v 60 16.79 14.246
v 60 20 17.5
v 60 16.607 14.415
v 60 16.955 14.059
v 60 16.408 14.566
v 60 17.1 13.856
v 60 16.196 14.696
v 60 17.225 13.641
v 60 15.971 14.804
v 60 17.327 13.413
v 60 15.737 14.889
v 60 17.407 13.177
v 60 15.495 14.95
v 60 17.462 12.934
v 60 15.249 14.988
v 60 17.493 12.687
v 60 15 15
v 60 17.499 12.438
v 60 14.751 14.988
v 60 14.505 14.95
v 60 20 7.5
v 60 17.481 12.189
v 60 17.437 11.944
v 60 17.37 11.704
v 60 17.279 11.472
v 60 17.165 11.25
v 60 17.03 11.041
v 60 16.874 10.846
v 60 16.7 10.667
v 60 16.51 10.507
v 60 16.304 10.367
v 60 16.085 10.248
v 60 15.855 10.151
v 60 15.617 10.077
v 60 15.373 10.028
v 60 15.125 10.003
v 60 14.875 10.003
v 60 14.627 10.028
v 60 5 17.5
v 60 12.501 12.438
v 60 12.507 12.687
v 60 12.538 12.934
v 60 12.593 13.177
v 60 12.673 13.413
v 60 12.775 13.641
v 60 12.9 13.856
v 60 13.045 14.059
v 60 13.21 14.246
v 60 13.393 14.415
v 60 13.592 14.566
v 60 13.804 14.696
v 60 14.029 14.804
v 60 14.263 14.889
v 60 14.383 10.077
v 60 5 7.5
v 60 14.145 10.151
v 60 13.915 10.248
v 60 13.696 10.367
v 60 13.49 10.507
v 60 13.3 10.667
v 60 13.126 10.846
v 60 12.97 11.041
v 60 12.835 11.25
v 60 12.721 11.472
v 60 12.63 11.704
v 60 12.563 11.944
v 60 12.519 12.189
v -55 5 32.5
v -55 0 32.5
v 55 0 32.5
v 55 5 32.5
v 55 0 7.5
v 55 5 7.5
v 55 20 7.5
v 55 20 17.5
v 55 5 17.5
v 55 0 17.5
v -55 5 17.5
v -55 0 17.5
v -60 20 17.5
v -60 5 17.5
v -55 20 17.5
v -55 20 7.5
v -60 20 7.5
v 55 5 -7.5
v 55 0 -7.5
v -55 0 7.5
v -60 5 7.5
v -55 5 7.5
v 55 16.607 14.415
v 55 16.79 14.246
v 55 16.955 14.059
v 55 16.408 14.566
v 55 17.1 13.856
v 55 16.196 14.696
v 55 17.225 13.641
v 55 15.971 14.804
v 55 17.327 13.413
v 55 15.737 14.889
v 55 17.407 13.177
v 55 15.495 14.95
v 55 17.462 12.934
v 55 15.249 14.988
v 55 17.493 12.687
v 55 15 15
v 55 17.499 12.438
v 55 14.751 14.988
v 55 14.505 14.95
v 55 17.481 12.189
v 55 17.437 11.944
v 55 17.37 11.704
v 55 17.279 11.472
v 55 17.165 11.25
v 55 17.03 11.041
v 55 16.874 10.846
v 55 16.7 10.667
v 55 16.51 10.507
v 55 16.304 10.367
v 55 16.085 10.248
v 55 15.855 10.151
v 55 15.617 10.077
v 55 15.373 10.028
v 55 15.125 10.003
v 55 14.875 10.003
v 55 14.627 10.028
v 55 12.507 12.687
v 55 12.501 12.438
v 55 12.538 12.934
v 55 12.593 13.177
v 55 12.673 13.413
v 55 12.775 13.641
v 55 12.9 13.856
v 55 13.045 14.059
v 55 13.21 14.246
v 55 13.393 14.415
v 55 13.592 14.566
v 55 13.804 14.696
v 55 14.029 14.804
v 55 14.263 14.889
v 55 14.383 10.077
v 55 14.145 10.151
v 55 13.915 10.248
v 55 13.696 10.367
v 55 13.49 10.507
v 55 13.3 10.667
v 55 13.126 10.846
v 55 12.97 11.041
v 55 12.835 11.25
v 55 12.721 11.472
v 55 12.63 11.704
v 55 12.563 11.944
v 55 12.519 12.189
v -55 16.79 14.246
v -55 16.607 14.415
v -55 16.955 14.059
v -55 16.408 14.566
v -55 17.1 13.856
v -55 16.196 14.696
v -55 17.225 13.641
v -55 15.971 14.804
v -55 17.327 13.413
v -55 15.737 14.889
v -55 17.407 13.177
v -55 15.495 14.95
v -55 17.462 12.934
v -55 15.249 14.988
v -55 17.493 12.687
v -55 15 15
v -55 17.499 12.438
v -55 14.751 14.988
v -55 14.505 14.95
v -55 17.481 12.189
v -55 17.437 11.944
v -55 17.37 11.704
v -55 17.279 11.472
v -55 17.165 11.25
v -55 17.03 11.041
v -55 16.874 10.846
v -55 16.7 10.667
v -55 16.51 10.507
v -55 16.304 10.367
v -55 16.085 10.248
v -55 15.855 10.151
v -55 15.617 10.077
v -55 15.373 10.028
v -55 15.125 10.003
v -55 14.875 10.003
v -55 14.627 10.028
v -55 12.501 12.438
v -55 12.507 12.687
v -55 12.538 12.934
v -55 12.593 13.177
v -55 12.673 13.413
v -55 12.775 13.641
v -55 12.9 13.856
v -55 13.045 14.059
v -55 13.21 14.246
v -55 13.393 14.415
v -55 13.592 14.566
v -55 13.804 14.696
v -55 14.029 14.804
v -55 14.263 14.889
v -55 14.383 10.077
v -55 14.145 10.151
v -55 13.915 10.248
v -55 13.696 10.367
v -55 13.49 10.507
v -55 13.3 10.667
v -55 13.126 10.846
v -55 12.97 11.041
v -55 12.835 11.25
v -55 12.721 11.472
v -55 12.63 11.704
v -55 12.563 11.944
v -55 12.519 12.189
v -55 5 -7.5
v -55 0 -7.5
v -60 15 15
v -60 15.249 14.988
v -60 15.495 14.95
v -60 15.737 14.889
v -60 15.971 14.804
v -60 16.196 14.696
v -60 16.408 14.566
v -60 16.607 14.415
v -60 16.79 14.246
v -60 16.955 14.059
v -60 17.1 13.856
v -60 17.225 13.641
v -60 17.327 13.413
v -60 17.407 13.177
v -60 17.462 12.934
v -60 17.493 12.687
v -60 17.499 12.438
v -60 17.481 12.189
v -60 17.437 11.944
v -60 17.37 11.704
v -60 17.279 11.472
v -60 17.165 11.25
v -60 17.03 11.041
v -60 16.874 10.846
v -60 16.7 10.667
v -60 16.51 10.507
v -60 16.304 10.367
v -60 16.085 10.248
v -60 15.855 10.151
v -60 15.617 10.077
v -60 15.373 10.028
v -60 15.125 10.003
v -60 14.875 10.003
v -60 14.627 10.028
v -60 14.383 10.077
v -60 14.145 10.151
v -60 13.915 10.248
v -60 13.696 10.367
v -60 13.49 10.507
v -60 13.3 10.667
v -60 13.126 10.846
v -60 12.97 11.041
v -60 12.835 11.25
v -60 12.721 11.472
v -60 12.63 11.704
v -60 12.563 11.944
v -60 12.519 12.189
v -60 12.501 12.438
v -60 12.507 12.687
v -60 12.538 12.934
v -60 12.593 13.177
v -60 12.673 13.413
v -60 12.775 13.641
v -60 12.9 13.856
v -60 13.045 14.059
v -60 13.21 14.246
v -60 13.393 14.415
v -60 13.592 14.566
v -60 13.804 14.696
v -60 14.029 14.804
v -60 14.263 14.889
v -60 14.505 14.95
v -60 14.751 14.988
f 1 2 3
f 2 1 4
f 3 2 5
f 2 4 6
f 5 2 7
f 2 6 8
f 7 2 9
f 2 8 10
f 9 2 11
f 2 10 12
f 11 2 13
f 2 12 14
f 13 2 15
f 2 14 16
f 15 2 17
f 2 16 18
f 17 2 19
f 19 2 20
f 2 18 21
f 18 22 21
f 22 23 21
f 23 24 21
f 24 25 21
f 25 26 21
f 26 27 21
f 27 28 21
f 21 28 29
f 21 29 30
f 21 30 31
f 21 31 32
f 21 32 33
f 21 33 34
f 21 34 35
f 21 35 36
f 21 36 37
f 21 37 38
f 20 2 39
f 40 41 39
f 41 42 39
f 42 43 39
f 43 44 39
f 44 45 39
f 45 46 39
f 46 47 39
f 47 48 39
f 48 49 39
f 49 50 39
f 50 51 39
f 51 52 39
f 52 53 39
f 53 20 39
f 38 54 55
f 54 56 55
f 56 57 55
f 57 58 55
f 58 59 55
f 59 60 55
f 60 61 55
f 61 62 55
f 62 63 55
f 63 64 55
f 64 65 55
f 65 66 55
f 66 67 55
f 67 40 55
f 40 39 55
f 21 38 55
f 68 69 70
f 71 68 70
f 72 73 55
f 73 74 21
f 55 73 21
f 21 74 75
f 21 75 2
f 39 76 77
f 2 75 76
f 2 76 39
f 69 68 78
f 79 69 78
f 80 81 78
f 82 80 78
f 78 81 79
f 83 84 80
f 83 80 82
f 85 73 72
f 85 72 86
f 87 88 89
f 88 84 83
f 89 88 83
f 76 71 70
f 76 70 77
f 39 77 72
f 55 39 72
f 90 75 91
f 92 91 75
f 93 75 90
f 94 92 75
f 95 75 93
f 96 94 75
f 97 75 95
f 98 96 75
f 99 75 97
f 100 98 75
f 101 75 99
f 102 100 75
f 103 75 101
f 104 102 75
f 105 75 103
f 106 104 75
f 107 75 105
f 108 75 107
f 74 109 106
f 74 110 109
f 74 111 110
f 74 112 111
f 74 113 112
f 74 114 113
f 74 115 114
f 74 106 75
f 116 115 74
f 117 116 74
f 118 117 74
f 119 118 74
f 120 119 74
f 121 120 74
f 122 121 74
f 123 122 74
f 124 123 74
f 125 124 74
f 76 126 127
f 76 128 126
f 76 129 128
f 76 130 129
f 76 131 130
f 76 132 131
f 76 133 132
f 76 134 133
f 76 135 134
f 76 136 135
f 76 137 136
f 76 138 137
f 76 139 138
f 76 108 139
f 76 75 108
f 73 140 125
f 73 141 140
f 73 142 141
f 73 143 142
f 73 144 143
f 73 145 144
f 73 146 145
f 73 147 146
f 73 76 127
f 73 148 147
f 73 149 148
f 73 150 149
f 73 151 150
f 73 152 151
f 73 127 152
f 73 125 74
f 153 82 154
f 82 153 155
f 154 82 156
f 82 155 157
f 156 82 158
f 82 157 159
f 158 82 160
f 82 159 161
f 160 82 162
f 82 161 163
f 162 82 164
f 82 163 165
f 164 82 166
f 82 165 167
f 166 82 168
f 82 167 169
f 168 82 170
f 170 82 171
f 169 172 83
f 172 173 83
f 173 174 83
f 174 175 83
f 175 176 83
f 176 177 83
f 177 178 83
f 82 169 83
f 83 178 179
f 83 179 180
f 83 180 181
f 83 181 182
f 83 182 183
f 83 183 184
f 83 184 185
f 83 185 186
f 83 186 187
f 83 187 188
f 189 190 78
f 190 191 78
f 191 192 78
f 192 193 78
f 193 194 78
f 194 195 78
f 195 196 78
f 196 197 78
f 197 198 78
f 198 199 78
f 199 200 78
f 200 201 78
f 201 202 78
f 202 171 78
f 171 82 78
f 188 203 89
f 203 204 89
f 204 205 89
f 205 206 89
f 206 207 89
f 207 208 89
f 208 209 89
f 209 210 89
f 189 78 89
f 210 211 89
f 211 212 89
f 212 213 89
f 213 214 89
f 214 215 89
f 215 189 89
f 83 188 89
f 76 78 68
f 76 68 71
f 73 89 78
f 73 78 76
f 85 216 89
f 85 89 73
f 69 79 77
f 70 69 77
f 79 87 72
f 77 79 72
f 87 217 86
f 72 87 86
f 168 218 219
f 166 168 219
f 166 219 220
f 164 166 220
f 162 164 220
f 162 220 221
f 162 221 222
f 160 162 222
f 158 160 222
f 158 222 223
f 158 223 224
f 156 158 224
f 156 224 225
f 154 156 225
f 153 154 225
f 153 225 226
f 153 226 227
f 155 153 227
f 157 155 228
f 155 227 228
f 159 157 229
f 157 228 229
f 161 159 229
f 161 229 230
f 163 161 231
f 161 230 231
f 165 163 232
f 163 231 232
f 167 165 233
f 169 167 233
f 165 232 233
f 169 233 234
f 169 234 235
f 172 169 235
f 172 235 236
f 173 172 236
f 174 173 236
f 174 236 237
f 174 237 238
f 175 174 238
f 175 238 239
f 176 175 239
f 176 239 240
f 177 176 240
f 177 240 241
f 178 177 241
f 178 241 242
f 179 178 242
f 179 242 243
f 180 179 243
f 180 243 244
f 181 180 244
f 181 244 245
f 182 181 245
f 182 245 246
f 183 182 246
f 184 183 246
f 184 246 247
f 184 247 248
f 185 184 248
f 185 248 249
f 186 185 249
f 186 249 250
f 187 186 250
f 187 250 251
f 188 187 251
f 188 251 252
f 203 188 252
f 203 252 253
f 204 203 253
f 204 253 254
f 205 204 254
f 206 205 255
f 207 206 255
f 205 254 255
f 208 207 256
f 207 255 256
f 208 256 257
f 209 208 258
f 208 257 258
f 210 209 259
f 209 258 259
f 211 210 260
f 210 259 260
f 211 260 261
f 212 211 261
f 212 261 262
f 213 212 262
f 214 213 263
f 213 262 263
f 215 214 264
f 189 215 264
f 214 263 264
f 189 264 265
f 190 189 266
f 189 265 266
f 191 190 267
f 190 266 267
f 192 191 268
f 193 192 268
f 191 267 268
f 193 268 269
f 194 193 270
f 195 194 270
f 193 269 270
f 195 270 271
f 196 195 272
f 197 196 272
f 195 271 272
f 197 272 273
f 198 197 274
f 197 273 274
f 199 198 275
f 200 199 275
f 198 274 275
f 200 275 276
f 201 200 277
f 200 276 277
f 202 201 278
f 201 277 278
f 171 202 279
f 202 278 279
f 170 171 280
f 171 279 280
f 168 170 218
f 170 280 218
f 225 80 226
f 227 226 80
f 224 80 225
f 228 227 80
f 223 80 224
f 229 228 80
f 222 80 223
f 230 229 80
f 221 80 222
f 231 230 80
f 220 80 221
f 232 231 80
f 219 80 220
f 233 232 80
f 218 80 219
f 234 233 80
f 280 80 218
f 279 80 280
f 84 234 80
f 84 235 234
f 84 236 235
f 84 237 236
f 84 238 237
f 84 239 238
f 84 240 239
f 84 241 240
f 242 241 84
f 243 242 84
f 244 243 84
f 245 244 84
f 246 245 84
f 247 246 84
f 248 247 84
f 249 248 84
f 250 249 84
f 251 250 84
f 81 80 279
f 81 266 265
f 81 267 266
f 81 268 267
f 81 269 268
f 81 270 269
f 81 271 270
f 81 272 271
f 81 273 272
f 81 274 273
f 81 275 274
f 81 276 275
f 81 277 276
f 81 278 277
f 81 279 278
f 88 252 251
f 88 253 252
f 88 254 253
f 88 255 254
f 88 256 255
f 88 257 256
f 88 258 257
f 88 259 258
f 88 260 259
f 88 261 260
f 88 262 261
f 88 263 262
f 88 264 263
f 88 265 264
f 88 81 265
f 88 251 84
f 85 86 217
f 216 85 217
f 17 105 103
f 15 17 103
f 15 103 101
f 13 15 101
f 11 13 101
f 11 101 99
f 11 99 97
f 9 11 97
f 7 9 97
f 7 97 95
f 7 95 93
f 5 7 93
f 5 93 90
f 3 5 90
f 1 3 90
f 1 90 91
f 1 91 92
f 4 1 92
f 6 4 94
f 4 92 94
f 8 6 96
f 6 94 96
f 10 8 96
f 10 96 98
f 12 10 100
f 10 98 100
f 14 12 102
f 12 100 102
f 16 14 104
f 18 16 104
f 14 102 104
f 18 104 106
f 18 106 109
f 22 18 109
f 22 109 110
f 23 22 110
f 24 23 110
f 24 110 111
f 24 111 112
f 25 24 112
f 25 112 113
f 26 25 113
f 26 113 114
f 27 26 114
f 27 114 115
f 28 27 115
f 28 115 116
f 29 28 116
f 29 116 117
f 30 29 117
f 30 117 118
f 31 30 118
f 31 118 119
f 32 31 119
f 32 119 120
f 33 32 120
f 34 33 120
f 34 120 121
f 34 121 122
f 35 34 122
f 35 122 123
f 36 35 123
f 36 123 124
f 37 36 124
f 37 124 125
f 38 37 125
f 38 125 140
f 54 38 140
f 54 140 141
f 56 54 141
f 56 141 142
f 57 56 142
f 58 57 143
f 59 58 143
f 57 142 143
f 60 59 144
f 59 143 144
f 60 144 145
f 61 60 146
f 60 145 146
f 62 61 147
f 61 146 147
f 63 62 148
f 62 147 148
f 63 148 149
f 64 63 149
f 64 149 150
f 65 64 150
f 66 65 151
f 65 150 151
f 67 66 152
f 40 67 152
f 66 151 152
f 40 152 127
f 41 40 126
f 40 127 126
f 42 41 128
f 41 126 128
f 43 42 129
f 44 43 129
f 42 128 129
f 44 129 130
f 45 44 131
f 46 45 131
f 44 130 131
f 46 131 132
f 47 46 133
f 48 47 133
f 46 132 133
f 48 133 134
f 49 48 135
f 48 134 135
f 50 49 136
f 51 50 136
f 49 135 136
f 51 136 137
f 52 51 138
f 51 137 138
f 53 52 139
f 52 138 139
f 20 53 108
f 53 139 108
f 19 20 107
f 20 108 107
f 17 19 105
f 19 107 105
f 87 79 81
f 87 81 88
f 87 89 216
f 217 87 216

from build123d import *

# Parameters (mm, degrees)
SKETCH1_W           = 120
SKETCH1_H           = 85
BOSS_EXTRUDE1_DEPTH = 5
SKETCH2_W           = 5
SKETCH2_H           = 10
BOSS_EXTRUDE2_DEPTH = 15
SKETCH3_R           = 2.5
CUT_EXTRUDE1_DEPTH  = 129.865239689
SKETCH5_W           = 5
SKETCH5_H           = 25
SKETCH5_H_2         = 15
CUT_EXTRUDE2_DEPTH  = 76.041655099
CHAMFER1_SIZE       = 5
SKETCH6_W           = 110
SKETCH6_H           = 10
CUT_EXTRUDE3_DEPTH  = 77.198753271


with BuildPart() as part:
    # Sketch1 → Boss-Extrude1 (new body)
    with BuildSketch(Plane(origin=(0, 0, 0), x_dir=(1, 0, 0), z_dir=(0, 1, 0))):
        Rectangle(SKETCH1_W, SKETCH1_H)
    extrude(amount=BOSS_EXTRUDE1_DEPTH)

    # Sketch2 → Boss-Extrude2 (add)
    with BuildSketch(Plane(origin=(0, 5, 0), x_dir=(1, 0, 0), z_dir=(0, 1, 0))):
        with Locations((-57.5, 12.5)):
            Rectangle(SKETCH2_W, SKETCH2_H)
        with Locations((-57.5, -12.5)):
            Rectangle(SKETCH2_W, SKETCH2_H)
        with Locations((57.5, -12.5)):
            Rectangle(SKETCH2_W, SKETCH2_H)
        with Locations((57.5, 12.5)):
            Rectangle(SKETCH2_W, SKETCH2_H)
    extrude(amount=BOSS_EXTRUDE2_DEPTH)

    # Sketch3 → Cut-Extrude1 (cut, through all)
    with BuildSketch(Plane.ZY.offset(60)):
        with Locations((-12.5, 15)):
            Circle(SKETCH3_R)
        with Locations((12.5, 15)):
            Circle(SKETCH3_R)
    extrude(amount=-CUT_EXTRUDE1_DEPTH, mode=Mode.SUBTRACT)

    # Sketch5 → Cut-Extrude2 (cut, through all)
    with BuildSketch(Plane(origin=(0, 5, 0), x_dir=(1, 0, 0), z_dir=(0, 1, 0))):
        with Locations((-57.5, 30)):
            Rectangle(SKETCH5_W, SKETCH5_H)
        with Locations((-57.5, 0)):
            Rectangle(SKETCH5_W, SKETCH5_H_2)
        with Locations((-57.5, -30)):
            Rectangle(SKETCH5_W, SKETCH5_H)
        with Locations((57.5, -30)):
            Rectangle(SKETCH5_W, SKETCH5_H)
        with Locations((57.5, 0)):
            Rectangle(SKETCH5_W, SKETCH5_H_2)
        with Locations((57.5, 30)):
            Rectangle(SKETCH5_W, SKETCH5_H)
    extrude(amount=-CUT_EXTRUDE2_DEPTH, mode=Mode.SUBTRACT)

    # Chamfer1
    chamfer1_edges = [part.edges().sort_by_distance(p)[0] for p in [
        (-60, 0, 12.5),
        (-60, 0, -12.5),
        (60, 0, -12.5),
        (60, 0, 12.5),
    ]]
    chamfer(chamfer1_edges, length=CHAMFER1_SIZE)

    # Sketch6 → Cut-Extrude3 (cut, through all)
    with BuildSketch(Plane.XZ):
        Polygon((-55, -7.5), (55, -7.5), (55, -17.5), (55, -42.5), (-55, -42.5), (-55, -17.5), align=None)
        Polygon((-60, -7.5), (-60, -42.5), (-55, -42.5), (-55, -17.5), (-55, -7.5), align=None)
        with Locations((0, 37.5)):
            Rectangle(SKETCH6_W, SKETCH6_H)
        Polygon((55, -42.5), (60, -42.5), (60, -7.5), (55, -7.5), (55, -17.5), align=None)
    extrude(amount=-CUT_EXTRUDE3_DEPTH, mode=Mode.SUBTRACT)


solid = part.part
